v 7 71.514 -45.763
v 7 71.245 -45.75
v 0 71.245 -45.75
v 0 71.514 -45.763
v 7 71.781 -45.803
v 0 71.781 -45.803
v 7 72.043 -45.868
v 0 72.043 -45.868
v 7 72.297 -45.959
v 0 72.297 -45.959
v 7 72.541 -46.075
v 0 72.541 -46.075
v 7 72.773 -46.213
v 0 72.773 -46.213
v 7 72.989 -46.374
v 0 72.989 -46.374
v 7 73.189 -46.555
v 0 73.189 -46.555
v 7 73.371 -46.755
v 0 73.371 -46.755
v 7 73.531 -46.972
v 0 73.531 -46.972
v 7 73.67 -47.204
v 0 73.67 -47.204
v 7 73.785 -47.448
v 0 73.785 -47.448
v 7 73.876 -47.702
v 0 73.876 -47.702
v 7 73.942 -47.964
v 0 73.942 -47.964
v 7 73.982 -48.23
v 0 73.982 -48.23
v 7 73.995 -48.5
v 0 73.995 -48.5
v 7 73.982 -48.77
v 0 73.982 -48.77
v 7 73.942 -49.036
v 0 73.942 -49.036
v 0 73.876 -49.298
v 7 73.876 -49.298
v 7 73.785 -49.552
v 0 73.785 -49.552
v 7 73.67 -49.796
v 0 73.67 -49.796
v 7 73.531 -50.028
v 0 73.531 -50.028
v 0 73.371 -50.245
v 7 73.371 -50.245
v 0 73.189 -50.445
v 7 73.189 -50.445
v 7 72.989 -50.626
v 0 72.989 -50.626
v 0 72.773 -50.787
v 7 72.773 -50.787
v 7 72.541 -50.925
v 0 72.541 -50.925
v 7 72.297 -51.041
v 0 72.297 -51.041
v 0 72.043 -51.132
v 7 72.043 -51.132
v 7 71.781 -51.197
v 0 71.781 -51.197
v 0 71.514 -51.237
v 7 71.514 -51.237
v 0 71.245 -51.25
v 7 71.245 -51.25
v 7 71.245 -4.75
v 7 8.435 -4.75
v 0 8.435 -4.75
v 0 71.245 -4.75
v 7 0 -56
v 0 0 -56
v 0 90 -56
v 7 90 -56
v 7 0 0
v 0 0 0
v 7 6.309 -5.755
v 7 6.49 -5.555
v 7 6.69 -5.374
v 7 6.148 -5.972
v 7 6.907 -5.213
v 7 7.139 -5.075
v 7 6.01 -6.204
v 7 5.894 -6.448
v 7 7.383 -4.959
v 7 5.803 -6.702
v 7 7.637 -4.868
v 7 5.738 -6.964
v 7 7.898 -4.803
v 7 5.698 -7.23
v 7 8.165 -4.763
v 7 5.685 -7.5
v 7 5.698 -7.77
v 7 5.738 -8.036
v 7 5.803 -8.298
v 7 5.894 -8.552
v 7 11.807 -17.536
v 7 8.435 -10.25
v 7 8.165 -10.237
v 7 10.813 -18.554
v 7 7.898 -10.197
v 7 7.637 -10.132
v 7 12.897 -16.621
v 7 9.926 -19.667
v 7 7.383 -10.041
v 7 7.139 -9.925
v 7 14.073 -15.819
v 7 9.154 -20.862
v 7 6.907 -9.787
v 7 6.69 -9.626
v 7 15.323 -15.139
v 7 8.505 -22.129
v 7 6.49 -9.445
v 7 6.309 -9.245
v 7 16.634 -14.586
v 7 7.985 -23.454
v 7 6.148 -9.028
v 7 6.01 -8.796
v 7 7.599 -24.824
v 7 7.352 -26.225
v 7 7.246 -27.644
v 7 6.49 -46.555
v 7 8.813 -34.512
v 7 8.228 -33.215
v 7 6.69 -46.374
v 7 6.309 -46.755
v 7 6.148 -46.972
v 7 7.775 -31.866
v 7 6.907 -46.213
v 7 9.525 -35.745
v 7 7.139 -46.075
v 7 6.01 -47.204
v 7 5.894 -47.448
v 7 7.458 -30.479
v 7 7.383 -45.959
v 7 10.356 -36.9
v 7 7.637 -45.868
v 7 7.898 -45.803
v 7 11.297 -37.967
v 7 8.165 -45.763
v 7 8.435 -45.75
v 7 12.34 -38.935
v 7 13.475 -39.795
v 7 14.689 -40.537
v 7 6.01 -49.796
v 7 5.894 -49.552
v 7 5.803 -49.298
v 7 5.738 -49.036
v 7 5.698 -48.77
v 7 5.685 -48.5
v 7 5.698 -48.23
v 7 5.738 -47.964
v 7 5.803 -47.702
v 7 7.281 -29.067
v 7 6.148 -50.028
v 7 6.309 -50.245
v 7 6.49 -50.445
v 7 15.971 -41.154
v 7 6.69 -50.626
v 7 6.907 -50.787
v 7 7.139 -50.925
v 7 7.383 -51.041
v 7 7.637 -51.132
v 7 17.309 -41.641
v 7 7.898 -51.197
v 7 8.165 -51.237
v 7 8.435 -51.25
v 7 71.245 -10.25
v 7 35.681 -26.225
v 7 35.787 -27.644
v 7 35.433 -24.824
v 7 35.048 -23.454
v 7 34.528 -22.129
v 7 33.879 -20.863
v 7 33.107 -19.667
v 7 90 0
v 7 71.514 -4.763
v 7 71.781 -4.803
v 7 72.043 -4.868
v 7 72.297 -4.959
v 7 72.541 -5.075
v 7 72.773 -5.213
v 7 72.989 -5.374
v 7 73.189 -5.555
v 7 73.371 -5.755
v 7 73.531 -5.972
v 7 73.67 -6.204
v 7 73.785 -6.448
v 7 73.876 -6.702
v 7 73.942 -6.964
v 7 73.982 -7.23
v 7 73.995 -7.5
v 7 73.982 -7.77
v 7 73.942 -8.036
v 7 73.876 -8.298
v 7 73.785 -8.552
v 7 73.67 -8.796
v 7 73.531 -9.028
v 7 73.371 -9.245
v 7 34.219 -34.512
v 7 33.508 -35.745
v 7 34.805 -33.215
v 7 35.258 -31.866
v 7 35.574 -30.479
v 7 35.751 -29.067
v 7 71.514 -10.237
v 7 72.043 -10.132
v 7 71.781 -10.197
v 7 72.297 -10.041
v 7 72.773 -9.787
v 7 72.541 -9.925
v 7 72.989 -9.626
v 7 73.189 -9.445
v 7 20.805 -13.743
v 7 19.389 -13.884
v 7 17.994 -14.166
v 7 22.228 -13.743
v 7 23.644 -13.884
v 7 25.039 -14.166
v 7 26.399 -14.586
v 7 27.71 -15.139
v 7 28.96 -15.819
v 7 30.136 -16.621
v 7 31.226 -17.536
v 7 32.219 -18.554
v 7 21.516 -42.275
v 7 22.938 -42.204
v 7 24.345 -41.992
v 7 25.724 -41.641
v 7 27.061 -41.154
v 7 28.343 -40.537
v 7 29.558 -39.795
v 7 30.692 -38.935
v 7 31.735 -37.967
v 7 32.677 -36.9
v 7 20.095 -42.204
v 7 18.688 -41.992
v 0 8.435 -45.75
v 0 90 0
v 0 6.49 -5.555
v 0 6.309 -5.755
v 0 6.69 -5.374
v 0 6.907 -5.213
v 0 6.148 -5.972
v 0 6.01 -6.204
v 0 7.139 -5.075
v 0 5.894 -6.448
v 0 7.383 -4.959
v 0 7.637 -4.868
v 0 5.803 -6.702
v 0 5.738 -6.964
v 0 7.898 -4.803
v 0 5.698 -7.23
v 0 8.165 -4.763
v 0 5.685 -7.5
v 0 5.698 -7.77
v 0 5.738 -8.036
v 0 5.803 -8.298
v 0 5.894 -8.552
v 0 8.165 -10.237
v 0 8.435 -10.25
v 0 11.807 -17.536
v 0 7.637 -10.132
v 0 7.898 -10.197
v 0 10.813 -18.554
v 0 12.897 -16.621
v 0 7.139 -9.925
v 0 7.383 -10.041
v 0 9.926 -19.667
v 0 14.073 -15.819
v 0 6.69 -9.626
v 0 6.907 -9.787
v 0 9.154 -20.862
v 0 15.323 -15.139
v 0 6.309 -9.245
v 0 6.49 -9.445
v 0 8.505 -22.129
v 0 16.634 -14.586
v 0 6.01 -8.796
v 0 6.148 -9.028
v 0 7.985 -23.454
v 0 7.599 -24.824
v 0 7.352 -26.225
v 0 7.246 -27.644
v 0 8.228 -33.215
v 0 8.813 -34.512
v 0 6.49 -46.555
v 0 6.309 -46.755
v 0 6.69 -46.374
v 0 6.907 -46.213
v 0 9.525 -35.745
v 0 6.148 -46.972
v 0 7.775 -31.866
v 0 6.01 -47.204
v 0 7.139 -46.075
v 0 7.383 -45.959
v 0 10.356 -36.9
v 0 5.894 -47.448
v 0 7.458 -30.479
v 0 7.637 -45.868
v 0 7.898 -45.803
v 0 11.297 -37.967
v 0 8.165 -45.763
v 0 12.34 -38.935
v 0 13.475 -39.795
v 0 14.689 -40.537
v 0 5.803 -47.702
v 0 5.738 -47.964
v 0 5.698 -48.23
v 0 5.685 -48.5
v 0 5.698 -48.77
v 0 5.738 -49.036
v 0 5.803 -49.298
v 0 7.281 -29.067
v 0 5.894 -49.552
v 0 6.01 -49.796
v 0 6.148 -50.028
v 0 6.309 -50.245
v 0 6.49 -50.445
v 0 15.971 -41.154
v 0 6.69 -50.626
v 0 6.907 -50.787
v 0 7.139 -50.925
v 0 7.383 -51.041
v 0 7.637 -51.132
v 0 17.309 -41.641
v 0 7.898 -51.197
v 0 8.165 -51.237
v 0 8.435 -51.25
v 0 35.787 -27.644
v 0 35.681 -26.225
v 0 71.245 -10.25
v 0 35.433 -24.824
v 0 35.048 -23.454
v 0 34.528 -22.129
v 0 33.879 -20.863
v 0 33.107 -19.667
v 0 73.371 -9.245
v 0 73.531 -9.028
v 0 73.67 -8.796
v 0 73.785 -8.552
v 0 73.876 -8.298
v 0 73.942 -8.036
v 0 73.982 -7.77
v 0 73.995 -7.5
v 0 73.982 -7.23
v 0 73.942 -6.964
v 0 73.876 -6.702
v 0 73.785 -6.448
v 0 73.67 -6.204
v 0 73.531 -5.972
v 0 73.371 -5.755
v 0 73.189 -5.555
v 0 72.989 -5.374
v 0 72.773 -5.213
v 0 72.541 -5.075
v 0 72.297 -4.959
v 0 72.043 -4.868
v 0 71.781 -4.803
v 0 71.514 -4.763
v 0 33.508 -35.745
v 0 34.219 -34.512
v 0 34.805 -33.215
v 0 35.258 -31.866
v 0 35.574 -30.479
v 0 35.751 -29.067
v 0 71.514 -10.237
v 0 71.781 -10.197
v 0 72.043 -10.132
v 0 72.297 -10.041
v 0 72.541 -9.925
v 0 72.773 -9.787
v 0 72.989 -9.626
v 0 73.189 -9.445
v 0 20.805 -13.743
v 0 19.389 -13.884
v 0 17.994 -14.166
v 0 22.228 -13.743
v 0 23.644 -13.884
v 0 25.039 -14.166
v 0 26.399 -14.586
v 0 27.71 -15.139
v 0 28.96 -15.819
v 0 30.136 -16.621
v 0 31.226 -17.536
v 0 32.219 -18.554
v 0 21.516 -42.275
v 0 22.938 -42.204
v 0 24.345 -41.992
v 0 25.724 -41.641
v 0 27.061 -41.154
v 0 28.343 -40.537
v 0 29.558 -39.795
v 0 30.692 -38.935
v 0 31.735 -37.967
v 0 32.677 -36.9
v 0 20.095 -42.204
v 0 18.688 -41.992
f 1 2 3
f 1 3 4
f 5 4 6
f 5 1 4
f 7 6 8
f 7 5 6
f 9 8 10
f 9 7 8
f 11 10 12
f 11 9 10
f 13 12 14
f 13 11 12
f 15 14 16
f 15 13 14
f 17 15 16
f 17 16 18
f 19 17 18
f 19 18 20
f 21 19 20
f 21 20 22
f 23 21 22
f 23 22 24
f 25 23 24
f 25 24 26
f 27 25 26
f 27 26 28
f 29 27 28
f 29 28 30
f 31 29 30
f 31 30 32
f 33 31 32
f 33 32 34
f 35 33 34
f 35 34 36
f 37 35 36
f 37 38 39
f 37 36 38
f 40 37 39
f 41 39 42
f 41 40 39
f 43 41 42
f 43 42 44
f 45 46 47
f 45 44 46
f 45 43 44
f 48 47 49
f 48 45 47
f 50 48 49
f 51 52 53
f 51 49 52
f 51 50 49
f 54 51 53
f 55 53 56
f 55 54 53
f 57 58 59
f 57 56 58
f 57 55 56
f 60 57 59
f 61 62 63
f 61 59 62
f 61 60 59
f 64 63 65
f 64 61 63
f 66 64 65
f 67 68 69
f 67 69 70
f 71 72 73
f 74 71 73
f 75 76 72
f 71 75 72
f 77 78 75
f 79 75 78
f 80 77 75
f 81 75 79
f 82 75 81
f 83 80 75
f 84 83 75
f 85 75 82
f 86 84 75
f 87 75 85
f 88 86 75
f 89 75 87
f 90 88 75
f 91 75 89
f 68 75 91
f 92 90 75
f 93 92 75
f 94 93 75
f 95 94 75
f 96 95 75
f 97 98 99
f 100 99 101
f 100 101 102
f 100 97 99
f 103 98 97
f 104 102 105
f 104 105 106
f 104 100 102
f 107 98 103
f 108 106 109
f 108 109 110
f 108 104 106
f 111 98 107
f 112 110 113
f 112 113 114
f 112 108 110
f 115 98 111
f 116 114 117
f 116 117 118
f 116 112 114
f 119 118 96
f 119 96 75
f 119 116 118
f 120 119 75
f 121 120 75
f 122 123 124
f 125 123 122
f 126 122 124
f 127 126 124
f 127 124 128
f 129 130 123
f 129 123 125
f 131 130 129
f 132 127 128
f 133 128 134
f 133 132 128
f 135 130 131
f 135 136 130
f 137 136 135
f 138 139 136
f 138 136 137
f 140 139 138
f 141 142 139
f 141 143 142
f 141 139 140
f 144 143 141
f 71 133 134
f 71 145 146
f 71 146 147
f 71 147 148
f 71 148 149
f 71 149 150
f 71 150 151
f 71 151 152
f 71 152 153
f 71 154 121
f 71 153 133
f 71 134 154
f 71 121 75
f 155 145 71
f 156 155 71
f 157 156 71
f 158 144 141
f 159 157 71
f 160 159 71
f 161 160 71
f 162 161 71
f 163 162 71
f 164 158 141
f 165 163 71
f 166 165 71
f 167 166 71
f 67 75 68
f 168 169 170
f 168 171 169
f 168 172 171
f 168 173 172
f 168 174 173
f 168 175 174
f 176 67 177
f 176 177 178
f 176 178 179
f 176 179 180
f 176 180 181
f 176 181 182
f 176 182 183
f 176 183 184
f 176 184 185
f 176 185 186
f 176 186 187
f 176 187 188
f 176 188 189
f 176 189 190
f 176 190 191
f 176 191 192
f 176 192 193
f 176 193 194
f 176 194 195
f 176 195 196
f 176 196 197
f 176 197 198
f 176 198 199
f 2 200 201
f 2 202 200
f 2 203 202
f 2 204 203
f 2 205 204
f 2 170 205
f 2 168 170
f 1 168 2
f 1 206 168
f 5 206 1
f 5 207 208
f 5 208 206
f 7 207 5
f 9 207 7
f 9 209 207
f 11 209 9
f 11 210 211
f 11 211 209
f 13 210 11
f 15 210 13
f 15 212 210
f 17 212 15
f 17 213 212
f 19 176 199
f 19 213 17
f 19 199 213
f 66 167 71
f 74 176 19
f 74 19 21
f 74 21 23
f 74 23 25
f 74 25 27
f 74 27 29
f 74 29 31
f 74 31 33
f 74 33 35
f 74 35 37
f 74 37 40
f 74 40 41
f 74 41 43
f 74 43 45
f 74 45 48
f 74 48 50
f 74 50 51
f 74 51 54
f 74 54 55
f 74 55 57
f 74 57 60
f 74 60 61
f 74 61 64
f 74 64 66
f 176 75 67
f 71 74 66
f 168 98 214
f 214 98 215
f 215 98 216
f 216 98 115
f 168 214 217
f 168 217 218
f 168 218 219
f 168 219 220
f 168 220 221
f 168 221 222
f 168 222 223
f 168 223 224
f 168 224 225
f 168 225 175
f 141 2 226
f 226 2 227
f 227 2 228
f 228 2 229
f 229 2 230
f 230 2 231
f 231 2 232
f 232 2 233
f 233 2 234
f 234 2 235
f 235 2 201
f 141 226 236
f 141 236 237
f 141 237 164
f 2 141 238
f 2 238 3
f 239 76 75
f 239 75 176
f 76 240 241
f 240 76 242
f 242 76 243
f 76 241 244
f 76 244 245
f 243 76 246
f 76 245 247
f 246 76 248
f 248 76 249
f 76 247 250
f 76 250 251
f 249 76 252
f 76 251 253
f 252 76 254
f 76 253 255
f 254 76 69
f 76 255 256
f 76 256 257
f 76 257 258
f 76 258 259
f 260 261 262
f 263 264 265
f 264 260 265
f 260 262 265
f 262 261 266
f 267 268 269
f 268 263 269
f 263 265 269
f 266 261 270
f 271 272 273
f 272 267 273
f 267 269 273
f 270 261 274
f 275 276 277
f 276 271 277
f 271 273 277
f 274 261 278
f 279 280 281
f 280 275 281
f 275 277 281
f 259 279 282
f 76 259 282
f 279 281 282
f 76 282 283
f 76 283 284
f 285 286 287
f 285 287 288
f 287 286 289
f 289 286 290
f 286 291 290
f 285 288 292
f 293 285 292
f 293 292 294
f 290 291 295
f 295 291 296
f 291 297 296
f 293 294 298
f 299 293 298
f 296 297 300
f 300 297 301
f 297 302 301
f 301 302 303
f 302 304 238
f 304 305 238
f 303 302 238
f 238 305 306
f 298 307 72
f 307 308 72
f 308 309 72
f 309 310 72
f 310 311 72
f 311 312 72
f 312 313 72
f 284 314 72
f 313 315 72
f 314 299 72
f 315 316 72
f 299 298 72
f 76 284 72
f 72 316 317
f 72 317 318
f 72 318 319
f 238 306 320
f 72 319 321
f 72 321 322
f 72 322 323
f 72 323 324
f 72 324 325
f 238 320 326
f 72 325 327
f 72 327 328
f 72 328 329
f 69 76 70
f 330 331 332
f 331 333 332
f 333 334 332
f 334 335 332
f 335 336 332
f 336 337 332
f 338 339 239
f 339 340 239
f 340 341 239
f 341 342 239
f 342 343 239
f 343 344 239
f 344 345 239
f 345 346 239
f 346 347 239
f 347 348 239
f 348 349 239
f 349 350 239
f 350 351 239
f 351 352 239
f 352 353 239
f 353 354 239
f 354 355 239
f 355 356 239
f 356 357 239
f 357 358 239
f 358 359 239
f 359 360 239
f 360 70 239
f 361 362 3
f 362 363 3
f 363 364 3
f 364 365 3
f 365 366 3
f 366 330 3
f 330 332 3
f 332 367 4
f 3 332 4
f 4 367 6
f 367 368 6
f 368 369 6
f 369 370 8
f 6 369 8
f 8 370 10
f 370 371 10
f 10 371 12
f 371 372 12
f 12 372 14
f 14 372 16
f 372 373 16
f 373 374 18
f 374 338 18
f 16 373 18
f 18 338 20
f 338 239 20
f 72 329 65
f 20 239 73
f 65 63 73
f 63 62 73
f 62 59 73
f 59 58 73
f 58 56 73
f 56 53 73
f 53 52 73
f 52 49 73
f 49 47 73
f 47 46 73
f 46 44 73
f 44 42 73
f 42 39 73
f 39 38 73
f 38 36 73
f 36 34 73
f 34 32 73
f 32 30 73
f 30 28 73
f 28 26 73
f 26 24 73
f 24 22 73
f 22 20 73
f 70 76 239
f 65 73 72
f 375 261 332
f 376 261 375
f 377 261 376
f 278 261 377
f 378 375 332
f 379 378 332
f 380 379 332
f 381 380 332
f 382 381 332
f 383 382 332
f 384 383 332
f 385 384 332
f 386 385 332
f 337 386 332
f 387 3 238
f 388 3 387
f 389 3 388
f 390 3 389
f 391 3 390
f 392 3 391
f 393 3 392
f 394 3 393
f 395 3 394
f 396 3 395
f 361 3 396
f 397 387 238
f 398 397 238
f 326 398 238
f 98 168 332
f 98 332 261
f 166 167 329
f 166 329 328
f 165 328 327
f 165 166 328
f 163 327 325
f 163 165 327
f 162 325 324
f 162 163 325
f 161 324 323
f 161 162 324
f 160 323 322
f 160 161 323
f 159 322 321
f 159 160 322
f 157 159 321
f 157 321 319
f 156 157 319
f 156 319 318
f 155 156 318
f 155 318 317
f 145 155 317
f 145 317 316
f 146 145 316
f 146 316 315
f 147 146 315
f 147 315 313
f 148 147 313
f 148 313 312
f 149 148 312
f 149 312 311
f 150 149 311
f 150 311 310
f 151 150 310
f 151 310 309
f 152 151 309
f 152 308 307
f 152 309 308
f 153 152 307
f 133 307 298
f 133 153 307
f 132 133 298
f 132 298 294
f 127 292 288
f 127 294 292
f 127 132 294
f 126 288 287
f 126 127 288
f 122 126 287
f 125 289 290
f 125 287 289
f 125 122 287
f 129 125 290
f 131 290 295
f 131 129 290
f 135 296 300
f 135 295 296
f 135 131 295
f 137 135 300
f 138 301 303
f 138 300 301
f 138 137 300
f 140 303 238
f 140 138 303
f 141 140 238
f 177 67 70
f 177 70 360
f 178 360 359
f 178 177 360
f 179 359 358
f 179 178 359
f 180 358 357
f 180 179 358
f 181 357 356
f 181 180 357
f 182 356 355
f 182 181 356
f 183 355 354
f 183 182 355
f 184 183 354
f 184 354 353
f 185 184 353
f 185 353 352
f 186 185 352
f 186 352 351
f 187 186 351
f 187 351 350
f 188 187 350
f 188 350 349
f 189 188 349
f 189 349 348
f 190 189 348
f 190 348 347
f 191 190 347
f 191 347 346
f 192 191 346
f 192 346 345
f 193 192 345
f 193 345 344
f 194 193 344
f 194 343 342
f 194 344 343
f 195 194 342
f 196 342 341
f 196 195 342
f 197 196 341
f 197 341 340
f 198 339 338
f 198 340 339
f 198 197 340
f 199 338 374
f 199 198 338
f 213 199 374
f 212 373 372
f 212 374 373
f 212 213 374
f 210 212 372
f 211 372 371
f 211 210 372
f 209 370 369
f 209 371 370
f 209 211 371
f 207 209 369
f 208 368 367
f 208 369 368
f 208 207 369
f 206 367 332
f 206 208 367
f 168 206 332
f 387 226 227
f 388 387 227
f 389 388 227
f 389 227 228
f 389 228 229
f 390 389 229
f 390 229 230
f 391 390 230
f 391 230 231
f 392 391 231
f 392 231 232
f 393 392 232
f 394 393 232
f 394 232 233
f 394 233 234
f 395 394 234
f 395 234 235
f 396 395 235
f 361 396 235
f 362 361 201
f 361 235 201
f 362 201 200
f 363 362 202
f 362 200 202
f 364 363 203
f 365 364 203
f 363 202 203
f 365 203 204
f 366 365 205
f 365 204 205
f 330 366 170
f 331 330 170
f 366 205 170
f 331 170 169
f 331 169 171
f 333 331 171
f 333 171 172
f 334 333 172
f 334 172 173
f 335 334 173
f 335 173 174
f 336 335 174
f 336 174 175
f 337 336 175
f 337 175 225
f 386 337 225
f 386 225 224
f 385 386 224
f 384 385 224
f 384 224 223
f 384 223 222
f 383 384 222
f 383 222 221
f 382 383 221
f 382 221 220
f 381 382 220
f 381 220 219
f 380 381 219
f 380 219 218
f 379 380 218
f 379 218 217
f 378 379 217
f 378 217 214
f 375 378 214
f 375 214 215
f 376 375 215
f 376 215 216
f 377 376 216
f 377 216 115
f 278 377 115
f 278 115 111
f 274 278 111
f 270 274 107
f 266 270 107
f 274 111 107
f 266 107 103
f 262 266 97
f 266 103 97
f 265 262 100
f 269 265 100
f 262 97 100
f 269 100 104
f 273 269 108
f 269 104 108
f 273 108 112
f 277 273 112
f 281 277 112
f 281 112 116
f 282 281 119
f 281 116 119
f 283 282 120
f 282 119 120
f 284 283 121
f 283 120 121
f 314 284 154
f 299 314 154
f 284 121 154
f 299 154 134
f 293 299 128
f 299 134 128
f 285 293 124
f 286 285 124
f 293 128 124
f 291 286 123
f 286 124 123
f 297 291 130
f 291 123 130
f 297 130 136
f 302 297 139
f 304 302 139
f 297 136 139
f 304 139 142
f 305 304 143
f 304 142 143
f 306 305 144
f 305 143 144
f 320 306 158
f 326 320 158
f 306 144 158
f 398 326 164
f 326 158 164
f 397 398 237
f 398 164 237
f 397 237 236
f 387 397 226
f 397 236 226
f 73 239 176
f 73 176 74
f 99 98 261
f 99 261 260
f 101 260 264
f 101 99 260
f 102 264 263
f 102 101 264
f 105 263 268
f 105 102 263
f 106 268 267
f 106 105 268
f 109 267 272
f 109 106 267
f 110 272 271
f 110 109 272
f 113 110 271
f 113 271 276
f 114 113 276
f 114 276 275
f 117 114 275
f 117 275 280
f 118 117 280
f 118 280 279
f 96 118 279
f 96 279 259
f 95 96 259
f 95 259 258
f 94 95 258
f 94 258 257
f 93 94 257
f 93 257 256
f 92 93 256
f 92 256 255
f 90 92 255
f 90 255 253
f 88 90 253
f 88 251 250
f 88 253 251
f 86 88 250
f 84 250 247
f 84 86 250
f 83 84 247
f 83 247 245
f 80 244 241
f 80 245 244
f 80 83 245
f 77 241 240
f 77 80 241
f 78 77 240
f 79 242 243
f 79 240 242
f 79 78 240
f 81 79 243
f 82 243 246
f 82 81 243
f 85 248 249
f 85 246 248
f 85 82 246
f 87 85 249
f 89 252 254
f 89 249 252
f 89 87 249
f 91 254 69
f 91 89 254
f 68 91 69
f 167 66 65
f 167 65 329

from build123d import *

# Parameters (mm, degrees)
SKETCH1_W           = 56
SKETCH1_H           = 90
BOSS_EXTRUDE1_DEPTH = 7
SKETCH2_R           = 14.275
CUT_EXTRUDE1_DEPTH  = 8
CUT_EXTRUDE2_DEPTH  = 8


with BuildPart() as part:
    # Sketch1 → Boss-Extrude1 (new body)
    with BuildSketch(Plane(origin=(0, 0, 0), x_dir=(0, 0, -1), z_dir=(1, 0, 0))):
        with Locations((28, 45)):
            Rectangle(SKETCH1_W, SKETCH1_H)
    extrude(amount=BOSS_EXTRUDE1_DEPTH)

    # Sketch2 → Cut-Extrude1 (cut, through all)
    with BuildSketch(Plane(origin=(7, 0, 0), x_dir=(0, 0, -1), z_dir=(1, 0, 0))):
        with Locations((28, 21.516289278)):
            Circle(SKETCH2_R)
    extrude(amount=-CUT_EXTRUDE1_DEPTH, mode=Mode.SUBTRACT)

    # Sketch3 → Cut-Extrude2 (cut, through all)
    with BuildSketch(Plane(origin=(7, 0, 0), x_dir=(0, 0, -1), z_dir=(1, 0, 0))):
        with BuildLine():
            Line((10.25, 71.244817418), (10.25, 8.434985259))
            ThreePointArc((10.25, 8.434985259), (7.5, 5.684985259), (4.75, 8.434985259))
            Line((4.75, 8.434985259), (4.75, 71.244817418))
            ThreePointArc((4.75, 71.244817418), (7.5, 73.994817418), (10.25, 71.244817418))
        make_face()
        with BuildLine():
            Line((45.75, 8.434985259), (45.75, 71.244817418))
            ThreePointArc((45.75, 71.244817418), (48.5, 73.994817418), (51.25, 71.244817418))
            Line((51.25, 71.244817418), (51.25, 8.434985259))
            ThreePointArc((51.25, 8.434985259), (48.5, 5.684985259), (45.75, 8.434985259))
        make_face()
    extrude(amount=-CUT_EXTRUDE2_DEPTH, mode=Mode.SUBTRACT)


solid = part.part
